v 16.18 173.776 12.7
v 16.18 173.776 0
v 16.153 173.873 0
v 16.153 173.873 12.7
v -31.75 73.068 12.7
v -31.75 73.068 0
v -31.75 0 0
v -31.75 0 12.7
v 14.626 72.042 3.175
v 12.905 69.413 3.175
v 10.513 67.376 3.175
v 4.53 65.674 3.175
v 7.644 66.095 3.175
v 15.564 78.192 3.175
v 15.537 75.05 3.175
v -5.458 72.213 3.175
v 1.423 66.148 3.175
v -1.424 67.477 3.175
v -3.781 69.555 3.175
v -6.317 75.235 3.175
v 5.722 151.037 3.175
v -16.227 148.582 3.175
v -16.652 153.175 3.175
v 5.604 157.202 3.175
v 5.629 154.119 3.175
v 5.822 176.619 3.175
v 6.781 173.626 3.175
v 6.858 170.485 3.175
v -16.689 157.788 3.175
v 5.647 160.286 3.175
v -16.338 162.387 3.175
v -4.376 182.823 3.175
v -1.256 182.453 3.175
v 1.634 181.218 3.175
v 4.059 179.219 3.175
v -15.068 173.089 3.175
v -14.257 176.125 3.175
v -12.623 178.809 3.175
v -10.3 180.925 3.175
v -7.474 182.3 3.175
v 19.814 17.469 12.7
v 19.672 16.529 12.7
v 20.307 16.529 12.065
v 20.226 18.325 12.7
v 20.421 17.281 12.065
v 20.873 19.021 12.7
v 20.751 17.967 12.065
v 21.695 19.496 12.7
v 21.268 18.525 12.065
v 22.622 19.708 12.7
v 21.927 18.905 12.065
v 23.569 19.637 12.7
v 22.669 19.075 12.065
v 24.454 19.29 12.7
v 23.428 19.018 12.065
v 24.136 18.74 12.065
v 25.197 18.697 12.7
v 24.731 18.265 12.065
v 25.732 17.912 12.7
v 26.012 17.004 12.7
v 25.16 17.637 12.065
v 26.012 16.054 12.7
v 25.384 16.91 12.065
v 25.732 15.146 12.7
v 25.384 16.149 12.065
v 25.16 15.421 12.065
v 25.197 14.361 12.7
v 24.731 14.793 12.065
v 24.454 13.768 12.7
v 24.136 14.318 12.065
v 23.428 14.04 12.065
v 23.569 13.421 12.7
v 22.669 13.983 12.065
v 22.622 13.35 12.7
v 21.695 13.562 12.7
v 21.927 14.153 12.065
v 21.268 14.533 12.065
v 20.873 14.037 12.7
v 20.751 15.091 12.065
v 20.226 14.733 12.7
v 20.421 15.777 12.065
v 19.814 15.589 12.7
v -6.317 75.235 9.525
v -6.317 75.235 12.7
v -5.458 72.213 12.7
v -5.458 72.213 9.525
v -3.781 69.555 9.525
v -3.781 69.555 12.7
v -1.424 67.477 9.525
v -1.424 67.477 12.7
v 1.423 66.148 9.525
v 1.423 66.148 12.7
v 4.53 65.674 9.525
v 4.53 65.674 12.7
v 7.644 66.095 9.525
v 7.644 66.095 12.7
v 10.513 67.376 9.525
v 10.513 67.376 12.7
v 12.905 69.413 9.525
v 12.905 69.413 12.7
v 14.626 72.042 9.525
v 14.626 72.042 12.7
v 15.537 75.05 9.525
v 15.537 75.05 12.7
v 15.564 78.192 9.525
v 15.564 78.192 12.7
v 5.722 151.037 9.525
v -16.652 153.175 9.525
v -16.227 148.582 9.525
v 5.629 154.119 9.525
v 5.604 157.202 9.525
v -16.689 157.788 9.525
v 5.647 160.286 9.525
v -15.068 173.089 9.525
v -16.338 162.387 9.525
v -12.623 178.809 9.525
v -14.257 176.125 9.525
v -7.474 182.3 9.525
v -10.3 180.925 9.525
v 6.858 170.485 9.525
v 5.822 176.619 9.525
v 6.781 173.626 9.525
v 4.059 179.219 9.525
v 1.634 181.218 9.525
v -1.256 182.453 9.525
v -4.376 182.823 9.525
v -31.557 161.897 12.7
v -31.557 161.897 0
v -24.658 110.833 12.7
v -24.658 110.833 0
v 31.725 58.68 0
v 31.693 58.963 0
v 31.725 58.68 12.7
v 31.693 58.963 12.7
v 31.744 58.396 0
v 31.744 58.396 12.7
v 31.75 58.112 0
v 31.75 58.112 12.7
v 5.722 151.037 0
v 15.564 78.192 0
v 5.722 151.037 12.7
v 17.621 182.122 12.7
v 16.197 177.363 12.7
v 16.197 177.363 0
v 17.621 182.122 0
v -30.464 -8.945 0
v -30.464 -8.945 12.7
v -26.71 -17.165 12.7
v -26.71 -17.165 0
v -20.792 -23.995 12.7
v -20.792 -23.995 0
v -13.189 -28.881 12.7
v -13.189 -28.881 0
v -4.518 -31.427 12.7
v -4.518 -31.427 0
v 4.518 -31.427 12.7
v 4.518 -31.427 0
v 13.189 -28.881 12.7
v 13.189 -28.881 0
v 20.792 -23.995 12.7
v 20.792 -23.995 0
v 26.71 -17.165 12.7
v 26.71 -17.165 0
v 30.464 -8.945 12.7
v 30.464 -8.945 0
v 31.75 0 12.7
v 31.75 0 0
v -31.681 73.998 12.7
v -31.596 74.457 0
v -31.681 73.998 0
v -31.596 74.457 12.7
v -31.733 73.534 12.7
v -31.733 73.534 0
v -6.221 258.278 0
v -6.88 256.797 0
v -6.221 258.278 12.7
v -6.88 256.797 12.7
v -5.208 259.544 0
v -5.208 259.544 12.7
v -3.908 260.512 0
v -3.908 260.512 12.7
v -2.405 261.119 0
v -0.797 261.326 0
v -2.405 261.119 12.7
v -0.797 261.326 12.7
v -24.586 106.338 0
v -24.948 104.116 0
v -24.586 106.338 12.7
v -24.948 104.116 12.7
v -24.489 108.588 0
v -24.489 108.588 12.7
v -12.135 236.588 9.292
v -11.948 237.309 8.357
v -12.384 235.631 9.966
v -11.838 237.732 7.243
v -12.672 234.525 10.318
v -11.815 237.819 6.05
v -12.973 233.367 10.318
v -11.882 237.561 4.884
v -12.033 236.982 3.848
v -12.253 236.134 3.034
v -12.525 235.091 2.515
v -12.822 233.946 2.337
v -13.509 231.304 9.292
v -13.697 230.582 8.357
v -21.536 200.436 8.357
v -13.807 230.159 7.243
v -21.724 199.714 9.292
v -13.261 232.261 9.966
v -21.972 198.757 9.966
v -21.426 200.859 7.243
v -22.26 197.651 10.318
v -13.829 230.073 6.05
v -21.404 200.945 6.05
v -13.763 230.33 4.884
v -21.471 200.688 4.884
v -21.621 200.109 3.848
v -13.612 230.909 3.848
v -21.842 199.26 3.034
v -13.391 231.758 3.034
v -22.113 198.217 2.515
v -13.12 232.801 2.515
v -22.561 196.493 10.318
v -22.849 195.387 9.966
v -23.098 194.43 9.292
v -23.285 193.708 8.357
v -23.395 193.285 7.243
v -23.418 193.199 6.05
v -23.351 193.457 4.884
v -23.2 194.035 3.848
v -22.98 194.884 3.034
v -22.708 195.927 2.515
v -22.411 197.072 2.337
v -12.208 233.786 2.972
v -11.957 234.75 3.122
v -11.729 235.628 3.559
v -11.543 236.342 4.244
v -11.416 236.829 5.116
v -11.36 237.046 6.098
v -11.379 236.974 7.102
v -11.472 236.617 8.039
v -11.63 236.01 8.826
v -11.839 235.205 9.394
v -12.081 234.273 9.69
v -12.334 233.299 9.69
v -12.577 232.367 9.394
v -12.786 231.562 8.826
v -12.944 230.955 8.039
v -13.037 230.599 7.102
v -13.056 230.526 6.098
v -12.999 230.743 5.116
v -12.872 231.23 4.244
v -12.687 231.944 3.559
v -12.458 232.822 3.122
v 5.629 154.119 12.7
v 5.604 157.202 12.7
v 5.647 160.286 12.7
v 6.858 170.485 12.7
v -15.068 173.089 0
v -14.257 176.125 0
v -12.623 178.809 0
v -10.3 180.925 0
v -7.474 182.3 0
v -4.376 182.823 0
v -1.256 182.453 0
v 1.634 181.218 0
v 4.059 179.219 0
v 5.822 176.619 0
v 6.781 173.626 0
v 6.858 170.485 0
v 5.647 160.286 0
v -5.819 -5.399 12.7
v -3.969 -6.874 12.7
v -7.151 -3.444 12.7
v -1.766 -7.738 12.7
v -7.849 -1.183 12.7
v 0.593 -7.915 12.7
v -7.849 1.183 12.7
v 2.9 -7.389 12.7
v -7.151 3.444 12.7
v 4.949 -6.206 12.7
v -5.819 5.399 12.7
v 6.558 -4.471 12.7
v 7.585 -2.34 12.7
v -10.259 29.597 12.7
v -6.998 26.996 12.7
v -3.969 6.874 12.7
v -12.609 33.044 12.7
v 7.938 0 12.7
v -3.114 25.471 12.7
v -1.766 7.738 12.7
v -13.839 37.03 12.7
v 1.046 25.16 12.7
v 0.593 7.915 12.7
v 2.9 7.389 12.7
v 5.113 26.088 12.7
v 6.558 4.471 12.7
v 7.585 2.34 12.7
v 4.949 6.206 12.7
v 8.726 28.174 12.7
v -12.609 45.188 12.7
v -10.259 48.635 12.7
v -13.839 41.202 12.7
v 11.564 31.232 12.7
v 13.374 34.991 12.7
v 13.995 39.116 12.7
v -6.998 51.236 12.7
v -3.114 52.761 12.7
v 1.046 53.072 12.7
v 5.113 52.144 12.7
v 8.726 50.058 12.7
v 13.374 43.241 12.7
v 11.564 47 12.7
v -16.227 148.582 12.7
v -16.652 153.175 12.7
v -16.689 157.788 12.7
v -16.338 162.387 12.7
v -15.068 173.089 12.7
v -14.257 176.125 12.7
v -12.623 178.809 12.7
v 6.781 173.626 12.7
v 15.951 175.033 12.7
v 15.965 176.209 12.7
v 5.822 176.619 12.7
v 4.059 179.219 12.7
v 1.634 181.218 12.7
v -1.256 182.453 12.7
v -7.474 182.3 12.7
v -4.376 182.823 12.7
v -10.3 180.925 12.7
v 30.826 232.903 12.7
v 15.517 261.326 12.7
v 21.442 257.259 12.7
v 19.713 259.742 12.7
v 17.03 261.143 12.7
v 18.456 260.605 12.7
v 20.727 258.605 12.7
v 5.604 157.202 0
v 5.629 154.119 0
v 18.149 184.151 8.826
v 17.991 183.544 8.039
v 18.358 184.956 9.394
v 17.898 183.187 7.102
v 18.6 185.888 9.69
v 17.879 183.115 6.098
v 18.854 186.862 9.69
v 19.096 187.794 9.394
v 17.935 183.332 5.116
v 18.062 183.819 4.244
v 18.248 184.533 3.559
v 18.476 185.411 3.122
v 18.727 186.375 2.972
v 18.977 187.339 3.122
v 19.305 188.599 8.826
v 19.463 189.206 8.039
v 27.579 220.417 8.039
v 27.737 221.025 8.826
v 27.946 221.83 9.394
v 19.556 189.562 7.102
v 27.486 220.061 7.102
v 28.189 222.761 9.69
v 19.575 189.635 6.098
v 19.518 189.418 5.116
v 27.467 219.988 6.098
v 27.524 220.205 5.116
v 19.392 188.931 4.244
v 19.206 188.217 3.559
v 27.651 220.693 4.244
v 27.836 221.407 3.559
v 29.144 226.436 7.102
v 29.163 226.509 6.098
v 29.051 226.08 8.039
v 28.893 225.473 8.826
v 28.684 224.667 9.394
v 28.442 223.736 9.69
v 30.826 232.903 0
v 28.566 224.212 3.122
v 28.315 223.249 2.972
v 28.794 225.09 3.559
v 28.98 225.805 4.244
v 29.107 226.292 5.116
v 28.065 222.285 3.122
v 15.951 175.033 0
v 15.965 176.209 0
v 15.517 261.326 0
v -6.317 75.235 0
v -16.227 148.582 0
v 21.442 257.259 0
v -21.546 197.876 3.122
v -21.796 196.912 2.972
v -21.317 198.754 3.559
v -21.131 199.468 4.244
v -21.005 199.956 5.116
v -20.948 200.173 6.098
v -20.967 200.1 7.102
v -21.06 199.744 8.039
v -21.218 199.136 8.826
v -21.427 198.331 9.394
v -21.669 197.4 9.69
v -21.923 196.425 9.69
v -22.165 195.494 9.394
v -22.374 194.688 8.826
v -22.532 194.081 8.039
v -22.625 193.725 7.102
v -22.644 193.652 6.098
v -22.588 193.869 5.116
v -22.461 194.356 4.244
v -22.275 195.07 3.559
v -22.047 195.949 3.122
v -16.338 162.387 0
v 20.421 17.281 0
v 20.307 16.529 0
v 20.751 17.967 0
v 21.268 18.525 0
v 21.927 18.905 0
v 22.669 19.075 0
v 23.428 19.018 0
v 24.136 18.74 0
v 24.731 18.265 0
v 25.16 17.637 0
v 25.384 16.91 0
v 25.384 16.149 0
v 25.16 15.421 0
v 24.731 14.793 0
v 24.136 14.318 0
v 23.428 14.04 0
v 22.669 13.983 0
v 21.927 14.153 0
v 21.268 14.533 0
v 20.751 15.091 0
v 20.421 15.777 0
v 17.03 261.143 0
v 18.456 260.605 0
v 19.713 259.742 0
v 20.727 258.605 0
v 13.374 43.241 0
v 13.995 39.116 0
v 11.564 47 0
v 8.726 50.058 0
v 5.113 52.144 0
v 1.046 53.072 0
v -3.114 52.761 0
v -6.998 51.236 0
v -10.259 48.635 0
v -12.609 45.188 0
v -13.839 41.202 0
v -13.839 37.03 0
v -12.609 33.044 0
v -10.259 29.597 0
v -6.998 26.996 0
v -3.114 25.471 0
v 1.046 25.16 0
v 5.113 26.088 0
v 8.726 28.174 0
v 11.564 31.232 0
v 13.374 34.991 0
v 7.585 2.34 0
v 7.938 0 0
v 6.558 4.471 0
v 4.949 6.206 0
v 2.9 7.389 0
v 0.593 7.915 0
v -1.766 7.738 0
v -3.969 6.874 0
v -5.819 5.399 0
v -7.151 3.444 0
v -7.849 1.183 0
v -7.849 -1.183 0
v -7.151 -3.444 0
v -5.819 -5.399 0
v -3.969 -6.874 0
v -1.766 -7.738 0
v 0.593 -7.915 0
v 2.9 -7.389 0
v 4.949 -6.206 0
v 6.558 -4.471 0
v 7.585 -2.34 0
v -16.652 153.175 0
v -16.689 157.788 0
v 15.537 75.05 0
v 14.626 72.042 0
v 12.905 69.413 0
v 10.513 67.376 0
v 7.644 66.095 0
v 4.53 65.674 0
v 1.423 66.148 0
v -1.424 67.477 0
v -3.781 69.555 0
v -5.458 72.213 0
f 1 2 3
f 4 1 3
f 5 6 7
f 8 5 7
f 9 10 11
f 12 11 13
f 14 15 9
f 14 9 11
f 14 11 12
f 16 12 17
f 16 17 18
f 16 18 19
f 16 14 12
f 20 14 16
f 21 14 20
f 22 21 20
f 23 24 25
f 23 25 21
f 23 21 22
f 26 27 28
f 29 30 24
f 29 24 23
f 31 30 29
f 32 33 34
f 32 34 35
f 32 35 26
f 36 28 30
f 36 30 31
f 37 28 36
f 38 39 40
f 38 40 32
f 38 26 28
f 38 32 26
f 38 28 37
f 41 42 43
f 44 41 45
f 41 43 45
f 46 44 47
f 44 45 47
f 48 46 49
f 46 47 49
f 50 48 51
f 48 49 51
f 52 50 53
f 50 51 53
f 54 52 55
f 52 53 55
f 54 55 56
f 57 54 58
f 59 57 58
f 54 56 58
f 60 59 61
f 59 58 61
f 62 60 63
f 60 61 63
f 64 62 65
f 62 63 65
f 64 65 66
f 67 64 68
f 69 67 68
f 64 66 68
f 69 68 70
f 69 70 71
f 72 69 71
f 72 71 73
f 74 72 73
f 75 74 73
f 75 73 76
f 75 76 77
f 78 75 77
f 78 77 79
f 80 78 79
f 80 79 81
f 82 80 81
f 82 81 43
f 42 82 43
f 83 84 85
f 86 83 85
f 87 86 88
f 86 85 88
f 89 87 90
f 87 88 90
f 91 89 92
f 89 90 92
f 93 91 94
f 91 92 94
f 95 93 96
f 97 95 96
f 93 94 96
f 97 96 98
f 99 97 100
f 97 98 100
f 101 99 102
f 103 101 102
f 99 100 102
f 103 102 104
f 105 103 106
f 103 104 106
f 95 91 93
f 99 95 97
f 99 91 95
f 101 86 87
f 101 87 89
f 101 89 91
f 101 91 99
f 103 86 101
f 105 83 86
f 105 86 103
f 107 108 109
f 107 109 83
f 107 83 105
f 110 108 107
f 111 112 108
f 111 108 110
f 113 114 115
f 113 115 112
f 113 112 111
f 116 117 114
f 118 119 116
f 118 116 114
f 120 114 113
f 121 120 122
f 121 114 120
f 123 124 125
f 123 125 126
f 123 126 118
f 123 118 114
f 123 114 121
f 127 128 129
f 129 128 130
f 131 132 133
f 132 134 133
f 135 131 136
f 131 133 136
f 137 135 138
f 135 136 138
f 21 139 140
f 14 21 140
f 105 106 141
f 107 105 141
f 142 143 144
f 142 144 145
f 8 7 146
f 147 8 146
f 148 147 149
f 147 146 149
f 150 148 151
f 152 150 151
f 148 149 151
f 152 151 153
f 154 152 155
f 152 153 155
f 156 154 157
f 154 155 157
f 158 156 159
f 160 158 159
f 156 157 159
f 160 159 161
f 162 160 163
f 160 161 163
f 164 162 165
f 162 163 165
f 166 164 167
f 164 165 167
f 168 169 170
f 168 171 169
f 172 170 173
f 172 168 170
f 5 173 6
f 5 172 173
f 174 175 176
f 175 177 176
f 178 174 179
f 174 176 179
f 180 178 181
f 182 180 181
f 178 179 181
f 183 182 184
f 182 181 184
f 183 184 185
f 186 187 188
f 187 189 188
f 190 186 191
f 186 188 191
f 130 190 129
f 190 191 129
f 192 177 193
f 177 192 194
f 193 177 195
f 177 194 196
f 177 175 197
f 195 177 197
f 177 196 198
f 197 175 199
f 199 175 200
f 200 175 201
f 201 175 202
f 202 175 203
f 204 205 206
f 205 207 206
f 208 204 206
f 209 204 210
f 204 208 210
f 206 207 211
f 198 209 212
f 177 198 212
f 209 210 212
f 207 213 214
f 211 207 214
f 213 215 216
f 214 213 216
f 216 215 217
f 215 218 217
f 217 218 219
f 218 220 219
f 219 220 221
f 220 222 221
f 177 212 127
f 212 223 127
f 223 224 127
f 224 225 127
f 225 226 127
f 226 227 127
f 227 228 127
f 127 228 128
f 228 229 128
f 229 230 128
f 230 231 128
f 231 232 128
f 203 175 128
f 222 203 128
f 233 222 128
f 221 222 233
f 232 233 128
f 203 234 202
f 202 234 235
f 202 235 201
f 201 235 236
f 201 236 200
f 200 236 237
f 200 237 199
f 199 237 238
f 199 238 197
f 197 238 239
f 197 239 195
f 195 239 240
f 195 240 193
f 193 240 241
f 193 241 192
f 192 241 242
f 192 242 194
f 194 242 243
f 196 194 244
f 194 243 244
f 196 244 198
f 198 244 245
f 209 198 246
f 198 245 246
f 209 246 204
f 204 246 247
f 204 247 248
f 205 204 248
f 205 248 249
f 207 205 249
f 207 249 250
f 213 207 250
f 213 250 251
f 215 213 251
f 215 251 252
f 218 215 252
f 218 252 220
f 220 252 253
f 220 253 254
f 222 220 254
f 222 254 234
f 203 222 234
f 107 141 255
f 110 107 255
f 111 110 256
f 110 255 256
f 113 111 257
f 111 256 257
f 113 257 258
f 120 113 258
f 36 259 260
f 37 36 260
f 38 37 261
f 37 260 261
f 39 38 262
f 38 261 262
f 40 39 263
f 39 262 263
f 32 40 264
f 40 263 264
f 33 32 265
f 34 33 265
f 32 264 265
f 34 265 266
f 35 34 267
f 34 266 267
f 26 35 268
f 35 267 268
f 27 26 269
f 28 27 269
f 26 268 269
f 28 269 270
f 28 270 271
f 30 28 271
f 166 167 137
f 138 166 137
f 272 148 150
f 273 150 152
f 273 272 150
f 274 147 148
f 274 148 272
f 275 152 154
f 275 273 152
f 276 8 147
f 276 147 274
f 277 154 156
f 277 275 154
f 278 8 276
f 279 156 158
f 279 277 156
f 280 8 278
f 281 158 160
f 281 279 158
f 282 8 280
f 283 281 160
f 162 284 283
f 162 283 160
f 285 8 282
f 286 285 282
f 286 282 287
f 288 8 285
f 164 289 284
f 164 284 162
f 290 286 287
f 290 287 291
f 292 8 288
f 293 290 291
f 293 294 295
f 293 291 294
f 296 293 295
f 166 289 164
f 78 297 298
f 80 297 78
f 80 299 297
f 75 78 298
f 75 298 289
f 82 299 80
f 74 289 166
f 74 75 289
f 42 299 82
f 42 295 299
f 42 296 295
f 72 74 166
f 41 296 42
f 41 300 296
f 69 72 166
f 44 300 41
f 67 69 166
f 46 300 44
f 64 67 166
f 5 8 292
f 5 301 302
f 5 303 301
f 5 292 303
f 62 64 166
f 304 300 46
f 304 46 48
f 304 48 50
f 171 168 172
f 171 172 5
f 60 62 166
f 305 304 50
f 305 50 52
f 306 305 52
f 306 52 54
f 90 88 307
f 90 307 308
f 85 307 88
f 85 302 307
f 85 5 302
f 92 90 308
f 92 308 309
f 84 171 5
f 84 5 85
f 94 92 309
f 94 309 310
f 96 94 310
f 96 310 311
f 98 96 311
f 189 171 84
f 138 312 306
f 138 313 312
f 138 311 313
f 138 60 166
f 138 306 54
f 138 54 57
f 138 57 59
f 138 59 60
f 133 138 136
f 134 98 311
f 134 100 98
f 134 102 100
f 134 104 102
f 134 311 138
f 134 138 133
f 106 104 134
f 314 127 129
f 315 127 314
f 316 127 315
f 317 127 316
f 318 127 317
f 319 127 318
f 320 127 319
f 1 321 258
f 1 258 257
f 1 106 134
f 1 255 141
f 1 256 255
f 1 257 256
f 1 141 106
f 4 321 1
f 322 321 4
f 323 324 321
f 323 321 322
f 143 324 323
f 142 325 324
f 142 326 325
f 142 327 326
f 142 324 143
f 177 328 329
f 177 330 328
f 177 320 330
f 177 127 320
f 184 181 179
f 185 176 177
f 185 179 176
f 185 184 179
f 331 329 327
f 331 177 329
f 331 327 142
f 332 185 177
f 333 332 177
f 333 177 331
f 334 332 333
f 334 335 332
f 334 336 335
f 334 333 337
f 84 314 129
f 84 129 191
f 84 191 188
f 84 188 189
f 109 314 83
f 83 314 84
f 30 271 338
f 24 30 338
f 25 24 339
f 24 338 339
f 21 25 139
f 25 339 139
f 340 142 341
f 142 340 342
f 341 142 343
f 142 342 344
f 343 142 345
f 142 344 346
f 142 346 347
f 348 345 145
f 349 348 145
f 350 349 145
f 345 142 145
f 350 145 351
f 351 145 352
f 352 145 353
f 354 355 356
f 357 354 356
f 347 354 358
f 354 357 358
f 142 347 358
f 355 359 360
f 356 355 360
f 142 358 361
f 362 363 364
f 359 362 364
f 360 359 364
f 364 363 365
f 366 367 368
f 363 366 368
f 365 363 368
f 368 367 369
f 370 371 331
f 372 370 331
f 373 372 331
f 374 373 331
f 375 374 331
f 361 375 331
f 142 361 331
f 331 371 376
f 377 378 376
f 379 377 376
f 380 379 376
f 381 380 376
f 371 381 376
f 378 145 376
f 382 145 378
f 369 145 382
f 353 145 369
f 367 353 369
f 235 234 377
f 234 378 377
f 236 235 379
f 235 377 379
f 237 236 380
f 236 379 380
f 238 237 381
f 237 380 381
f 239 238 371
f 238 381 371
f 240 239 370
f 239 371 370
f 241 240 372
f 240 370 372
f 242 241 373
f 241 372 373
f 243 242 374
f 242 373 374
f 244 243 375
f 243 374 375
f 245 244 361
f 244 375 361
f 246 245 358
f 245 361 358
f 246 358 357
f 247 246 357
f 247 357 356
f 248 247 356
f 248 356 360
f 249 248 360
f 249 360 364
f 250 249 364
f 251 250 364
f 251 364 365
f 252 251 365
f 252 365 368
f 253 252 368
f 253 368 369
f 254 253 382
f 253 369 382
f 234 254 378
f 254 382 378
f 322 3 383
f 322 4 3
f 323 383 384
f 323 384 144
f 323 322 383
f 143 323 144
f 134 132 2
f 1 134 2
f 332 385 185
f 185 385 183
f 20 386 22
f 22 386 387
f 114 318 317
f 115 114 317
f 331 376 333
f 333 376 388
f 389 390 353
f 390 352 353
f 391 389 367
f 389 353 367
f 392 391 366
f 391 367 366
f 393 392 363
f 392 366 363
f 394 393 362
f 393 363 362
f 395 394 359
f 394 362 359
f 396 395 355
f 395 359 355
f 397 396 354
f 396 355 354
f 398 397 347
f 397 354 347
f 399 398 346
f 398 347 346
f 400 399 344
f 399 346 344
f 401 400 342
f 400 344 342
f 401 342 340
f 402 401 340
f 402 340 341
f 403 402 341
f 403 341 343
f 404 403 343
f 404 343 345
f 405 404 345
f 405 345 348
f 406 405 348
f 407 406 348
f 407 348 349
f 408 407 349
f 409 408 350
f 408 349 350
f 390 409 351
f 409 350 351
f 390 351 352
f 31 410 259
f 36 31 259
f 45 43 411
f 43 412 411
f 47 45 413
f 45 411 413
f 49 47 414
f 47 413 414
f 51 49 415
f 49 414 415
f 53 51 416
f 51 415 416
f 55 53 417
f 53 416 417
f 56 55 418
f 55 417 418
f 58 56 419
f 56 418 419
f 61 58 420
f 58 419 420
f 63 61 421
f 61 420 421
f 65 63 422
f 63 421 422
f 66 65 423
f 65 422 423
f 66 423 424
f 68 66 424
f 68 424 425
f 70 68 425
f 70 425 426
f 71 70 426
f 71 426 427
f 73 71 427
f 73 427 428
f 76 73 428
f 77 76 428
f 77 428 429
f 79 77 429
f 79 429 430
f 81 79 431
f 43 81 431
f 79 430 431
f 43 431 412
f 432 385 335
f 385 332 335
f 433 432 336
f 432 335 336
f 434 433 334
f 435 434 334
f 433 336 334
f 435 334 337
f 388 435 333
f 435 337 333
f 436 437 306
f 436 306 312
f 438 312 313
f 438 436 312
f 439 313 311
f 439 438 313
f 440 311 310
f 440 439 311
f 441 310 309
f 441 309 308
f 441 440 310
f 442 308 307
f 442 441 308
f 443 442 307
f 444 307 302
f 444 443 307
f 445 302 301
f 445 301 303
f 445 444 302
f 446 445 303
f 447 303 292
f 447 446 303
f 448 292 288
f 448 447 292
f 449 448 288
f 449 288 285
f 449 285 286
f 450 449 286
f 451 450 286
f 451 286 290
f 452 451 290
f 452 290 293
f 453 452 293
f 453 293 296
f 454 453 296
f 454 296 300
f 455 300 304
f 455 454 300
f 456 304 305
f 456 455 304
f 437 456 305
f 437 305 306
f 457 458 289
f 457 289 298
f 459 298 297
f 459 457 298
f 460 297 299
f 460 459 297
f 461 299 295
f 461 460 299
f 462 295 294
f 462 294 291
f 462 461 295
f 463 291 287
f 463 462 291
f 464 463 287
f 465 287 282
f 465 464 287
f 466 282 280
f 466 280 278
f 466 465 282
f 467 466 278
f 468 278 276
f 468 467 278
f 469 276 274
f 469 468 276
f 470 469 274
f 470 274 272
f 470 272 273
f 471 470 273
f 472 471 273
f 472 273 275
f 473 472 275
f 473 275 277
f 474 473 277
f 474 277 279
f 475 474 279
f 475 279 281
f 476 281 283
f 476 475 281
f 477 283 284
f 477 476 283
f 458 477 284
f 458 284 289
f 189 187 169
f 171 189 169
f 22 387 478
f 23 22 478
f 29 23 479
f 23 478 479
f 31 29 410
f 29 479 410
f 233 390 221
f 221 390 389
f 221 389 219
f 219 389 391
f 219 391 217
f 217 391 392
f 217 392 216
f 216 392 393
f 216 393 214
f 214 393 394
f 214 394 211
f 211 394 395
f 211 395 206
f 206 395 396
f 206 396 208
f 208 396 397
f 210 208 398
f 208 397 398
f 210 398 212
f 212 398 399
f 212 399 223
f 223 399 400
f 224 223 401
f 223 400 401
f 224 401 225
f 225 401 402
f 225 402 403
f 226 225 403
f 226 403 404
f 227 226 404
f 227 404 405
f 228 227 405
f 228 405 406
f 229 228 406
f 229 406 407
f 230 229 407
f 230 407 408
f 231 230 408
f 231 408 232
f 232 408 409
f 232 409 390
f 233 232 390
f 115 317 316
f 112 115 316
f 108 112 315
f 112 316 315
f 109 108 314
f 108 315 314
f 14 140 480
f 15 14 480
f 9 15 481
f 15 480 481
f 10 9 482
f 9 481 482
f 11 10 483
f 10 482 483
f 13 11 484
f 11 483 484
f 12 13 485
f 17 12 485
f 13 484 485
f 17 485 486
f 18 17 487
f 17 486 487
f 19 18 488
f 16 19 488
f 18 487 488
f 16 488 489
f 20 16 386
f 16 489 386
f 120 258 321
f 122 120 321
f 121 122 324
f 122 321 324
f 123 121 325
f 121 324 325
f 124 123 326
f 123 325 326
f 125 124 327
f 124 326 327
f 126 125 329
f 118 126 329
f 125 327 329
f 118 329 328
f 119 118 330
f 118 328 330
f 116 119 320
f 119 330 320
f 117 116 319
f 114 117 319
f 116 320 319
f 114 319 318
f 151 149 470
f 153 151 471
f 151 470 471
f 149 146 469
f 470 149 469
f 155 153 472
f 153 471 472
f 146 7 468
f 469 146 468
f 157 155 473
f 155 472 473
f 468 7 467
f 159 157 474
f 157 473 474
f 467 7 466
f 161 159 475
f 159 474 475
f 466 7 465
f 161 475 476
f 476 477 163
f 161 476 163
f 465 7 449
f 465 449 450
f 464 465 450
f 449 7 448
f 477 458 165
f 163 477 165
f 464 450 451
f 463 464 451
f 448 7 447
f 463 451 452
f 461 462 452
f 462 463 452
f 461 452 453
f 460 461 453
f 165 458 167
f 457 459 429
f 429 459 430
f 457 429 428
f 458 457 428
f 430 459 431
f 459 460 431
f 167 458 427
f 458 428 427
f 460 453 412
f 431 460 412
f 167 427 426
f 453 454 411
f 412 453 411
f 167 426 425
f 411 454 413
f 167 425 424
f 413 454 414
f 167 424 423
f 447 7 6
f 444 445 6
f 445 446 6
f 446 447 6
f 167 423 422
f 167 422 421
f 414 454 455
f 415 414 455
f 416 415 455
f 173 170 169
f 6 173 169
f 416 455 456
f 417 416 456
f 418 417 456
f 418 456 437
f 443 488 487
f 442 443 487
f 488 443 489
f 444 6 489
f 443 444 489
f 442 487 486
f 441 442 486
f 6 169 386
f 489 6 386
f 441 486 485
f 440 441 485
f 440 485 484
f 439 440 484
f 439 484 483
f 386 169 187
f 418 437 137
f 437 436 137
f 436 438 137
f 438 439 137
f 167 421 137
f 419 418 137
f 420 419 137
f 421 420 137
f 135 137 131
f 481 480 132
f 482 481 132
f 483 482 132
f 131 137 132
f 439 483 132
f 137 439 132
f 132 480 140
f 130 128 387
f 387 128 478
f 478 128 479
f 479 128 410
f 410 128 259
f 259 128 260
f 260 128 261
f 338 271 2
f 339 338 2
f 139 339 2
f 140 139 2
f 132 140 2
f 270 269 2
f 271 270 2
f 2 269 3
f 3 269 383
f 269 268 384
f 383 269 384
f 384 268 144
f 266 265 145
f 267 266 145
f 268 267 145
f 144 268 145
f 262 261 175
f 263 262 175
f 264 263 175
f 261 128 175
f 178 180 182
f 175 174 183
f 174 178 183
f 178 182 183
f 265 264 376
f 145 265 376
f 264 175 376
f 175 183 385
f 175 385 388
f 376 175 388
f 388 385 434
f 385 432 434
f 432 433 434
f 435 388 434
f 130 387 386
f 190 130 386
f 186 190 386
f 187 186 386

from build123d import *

# Parameters (mm, degrees)
SKETCH1_R                         = 7.9375
SKETCH1_R_2                       = 13.9954
BOSS_EXTRUDE1_DEPTH               = 12.7
FILLET3_R                         = 19.05
FILLET1_R                         = 6.35
F_10_CLEARANCE_HOLE2_D            = 5.1054
F_10_CLEARANCE_HOLE2_CSINK_D      = 6.3754
F_10_CLEARANCE_HOLE2_CSINK_ANGLE  = 90
CUT_EXTRUDE1_DEPTH                = 1
CUT_EXTRUDE1_DEPTH_BACK           = 13.7
FILLET2_R                         = 6.35
CUT_EXTRUDE3_DEPTH                = 1
CUT_EXTRUDE3_DEPTH_BACK           = 13.7
F_1_4_CLEARANCE_HOLE1_D           = 6.7564
F_1_4_CLEARANCE_HOLE1_CSINK_D     = 8.0264
F_1_4_CLEARANCE_HOLE1_CSINK_ANGLE = 90
CUT_EXTRUDE4_DEPTH                = 3.175
CUT_EXTRUDE5_DEPTH                = 3.175


with BuildPart() as part:
    # Sketch1 → Boss-Extrude1 (new body)
    with BuildSketch(Plane.XY):
        with BuildLine():
            Line((-24.200430201, 107.448474159), (-31.75, 73.770562428))
            Line((-31.75, 73.770562428), (-31.75, 0))
            ThreePointArc((-31.75, 0), (0, -31.75), (31.75, 0))
            Line((31.75, 0), (31.75, 116.627004246))
            Line((31.75, 116.627004246), (15.676297005, 175.624413942))
            Line((15.676297005, 175.624413942), (31.947601555, 229.990483385))
            Line((31.947601555, 229.990483385), (19.875208624, 261.32607122))
            Line((19.875208624, 261.32607122), (-5.524791376, 261.32607122))
            Line((-5.524791376, 261.32607122), (-32.716068836, 170.47392878))
            Line((-32.716068836, 170.47392878), (-24.200430201, 107.448474159))
        make_face()
        Circle(SKETCH1_R, mode=Mode.SUBTRACT)
        with Locations((0, 39.116)):
            Circle(SKETCH1_R_2, mode=Mode.SUBTRACT)
    extrude(amount=BOSS_EXTRUDE1_DEPTH)

    # Fillet3
    fillet3_edges = [part.edges().sort_by_distance(p)[0] for p in [
        (-24.200430201, 107.448474159, 6.35),
    ]]
    fillet(fillet3_edges, radius=FILLET3_R)

    # Fillet1
    fillet1_edges = [part.edges().sort_by_distance(p)[0] for p in [
        (-32.716068836, 170.47392878, 6.35),
        (-5.524791376, 261.32607122, 6.35),
        (19.875208624, 261.32607122, 6.35),
        (31.947601555, 229.990483385, 6.35),
        (15.676297005, 175.624413942, 6.35),
        (31.75, 116.627004246, 6.35),
        (-31.75, 73.770562428, 6.35),
    ]]
    fillet(fillet1_edges, radius=FILLET1_R)

    # #10 Clearance Hole2 (through all)
    with Locations(Plane.XY.offset(12.7)):
        with Locations((22.86, 16.52905)):
            CounterSinkHole(F_10_CLEARANCE_HOLE2_D / 2, F_10_CLEARANCE_HOLE2_CSINK_D / 2, counter_sink_angle=F_10_CLEARANCE_HOLE2_CSINK_ANGLE)

    # Sketch17 → Cut-Extrude1 (cut, two sides)
    with BuildSketch(Plane(origin=(0, 0, 0), x_dir=(-1, 0, 0), z_dir=(0, 0, -1))) as cut_extrude1_sk:
        with BuildLine():
            Line((-31.75, 58.539367012), (-16.179878819, 173.776051895))
            Line((-16.179878819, 173.776051895), (-31.526685006, 117.446666412))
            ThreePointArc((-31.526685006, 117.446666412), (-31.693923649, 116.619502039), (-31.75, 115.777465753))
            Line((-31.75, 115.777465753), (-31.75, 58.539367012))
        make_face()
    extrude(amount=CUT_EXTRUDE1_DEPTH, mode=Mode.SUBTRACT)
    extrude(cut_extrude1_sk.sketch, amount=-CUT_EXTRUDE1_DEPTH_BACK, mode=Mode.SUBTRACT)

    # Fillet2
    fillet2_edges = [part.edges().sort_by_distance(p)[0] for p in [
        (31.75, 58.539367012, 6.35),
    ]]
    fillet(fillet2_edges, radius=FILLET2_R)

    # Sketch19 → Cut-Extrude3 (cut, two sides)
    with BuildSketch(Plane(origin=(0, 0, 0), x_dir=(-1, 0, 0), z_dir=(0, 0, -1))) as cut_extrude3_sk:
        with BuildLine():
            Line((-17.620933209, 182.121878639), (-30.825593631, 232.902812203))
            Line((-30.825593631, 232.902812203), (-31.167525601, 232.015279853))
            ThreePointArc((-31.167525601, 232.015279853), (-31.587367542, 229.976620184), (-31.325446349, 227.911723628))
            Line((-31.325446349, 227.911723628), (-17.620933209, 182.121878639))
        make_face()
        with BuildLine():
            Line((32.32313572, 171.786806246), (6.880371133, 256.796775922))
            Line((6.880371133, 256.796775922), (31.557248698, 161.897335866))
            Line((31.557248698, 161.897335866), (32.532573251, 169.115851816))
            ThreePointArc((32.532573251, 169.115851816), (32.570321666, 170.462500309), (32.32313572, 171.786806246))
        make_face()
    extrude(amount=CUT_EXTRUDE3_DEPTH, mode=Mode.SUBTRACT)
    extrude(cut_extrude3_sk.sketch, amount=-CUT_EXTRUDE3_DEPTH_BACK, mode=Mode.SUBTRACT)

    # 1/4 Clearance Hole1 (through all)
    with Locations(Plane(origin=(-68.990792956, 17.939803964, 0), x_dir=(0, 0, 1), z_dir=(-0.967814998, 0.251662731, 0))):
        with Locations((6.35, 185.089358388), (6.35, 223.189358388)):
            CounterSinkHole(F_1_4_CLEARANCE_HOLE1_D / 2, F_1_4_CLEARANCE_HOLE1_CSINK_D / 2, counter_sink_angle=F_1_4_CLEARANCE_HOLE1_CSINK_ANGLE)

    # Sketch22 → Cut-Extrude4 (cut)
    with BuildSketch(Plane(origin=(0, 0, 0), x_dir=(-1, 0, 0), z_dir=(0, 0, -1))):
        with BuildLine():
            Line((-5.721549742, 151.036596427), (-15.563924684, 78.191777395))
            ThreePointArc((-15.563924684, 78.191777395), (-6.101580096, 65.772977875), (6.317219423, 75.235322463))
            Line((6.317219423, 75.235322463), (16.227356213, 148.58165658))
            ThreePointArc((16.227356213, 148.58165658), (16.127581623, 152.147558265), (14.895920611, 155.495486123))
            ThreePointArc((14.895920611, 155.495486123), (5.286667697, 150.045412833), (-4.233623122, 155.649438455))
            ThreePointArc((-4.233623122, 155.649438455), (-5.148189302, 153.664409279), (-5.653787894, 151.538111511))
            Line((-5.653787894, 151.538111511), (-5.721549742, 151.036596427))
        make_face()
        with BuildLine():
            ThreePointArc((14.895920611, 155.495486123), (5.375629793, 161.099511745), (-4.233623122, 155.649438455))
            ThreePointArc((-4.233623122, 155.649438455), (5.286667697, 150.045412833), (14.895920611, 155.495486123))
        make_face()
        with BuildLine():
            Line((-6.858366152, 170.484855738), (-5.647114594, 160.285630757))
            Line((-5.647114594, 160.285630757), (-5.587433271, 159.783090025))
            ThreePointArc((-5.587433271, 159.783090025), (-5.116122344, 157.648930204), (-4.233623122, 155.649438455))
            ThreePointArc((-4.233623122, 155.649438455), (5.375629793, 161.099511745), (14.895920611, 155.495486123))
            ThreePointArc((14.895920611, 155.495486123), (16.181306062, 158.823157086), (16.338459931, 162.386991041))
            Line((16.338459931, 162.386991041), (15.06752705, 173.088756754))
            ThreePointArc((15.06752705, 173.088756754), (2.802629941, 182.749752847), (-6.858366152, 170.484855738))
        make_face()
        with BuildLine():
            ThreePointArc((14.895920611, 155.495486123), (16.127581623, 152.147558265), (16.227356213, 148.58165658))
            ThreePointArc((16.227356213, 148.58165658), (16.719229878, 155.480812344), (16.338459931, 162.386991041))
            ThreePointArc((16.338459931, 162.386991041), (16.181306062, 158.823157086), (14.895920611, 155.495486123))
        make_face()
        with BuildLine():
            ThreePointArc((-5.647114594, 160.285630757), (-5.608314081, 155.660501807), (-5.721549742, 151.036596427))
            Line((-5.721549742, 151.036596427), (-5.653787894, 151.538111511))
            ThreePointArc((-5.653787894, 151.538111511), (-5.148189302, 153.664409279), (-4.233623122, 155.649438455))
            ThreePointArc((-4.233623122, 155.649438455), (-5.116122344, 157.648930204), (-5.587433271, 159.783090025))
            Line((-5.587433271, 159.783090025), (-5.647114594, 160.285630757))
        make_face()
    extrude(amount=-CUT_EXTRUDE4_DEPTH, mode=Mode.SUBTRACT)

    # Sketch23 → Cut-Extrude5 (cut)
    with BuildSketch(Plane.XY.offset(12.7)):
        with BuildLine():
            ThreePointArc((-6.317219423, 75.235322463), (6.101580096, 65.772977875), (15.563924684, 78.191777395))
            Line((15.563924684, 78.191777395), (5.721549742, 151.036596427))
            Line((5.721549742, 151.036596427), (5.653787894, 151.538111511))
            ThreePointArc((5.653787894, 151.538111511), (5.148189302, 153.664409279), (4.233623122, 155.649438455))
            ThreePointArc((4.233623122, 155.649438455), (-5.286667697, 150.045412833), (-14.895920611, 155.495486123))
            ThreePointArc((-14.895920611, 155.495486123), (-16.127581623, 152.147558265), (-16.227356213, 148.58165658))
            Line((-16.227356213, 148.58165658), (-6.317219423, 75.235322463))
        make_face()
        with BuildLine():
            ThreePointArc((-14.895920611, 155.495486123), (-5.286667697, 150.045412833), (4.233623122, 155.649438455))
            ThreePointArc((4.233623122, 155.649438455), (-5.375629793, 161.099511745), (-14.895920611, 155.495486123))
        make_face()
        with BuildLine():
            Line((5.587433271, 159.783090025), (5.647114594, 160.285630757))
            Line((5.647114594, 160.285630757), (6.858366152, 170.484855738))
            ThreePointArc((6.858366152, 170.484855738), (-2.802629941, 182.749752847), (-15.06752705, 173.088756754))
            Line((-15.06752705, 173.088756754), (-16.338459931, 162.386991041))
            ThreePointArc((-16.338459931, 162.386991041), (-16.181306062, 158.823157086), (-14.895920611, 155.495486123))
            ThreePointArc((-14.895920611, 155.495486123), (-5.375629793, 161.099511745), (4.233623122, 155.649438455))
            ThreePointArc((4.233623122, 155.649438455), (5.116122344, 157.648930204), (5.587433271, 159.783090025))
        make_face()
        with BuildLine():
            ThreePointArc((-16.338459931, 162.386991041), (-16.719229878, 155.480812344), (-16.227356213, 148.58165658))
            ThreePointArc((-16.227356213, 148.58165658), (-16.127581623, 152.147558265), (-14.895920611, 155.495486123))
            ThreePointArc((-14.895920611, 155.495486123), (-16.181306062, 158.823157086), (-16.338459931, 162.386991041))
        make_face()
        with BuildLine():
            Line((5.653787894, 151.538111511), (5.721549742, 151.036596427))
            ThreePointArc((5.721549742, 151.036596427), (5.608314081, 155.660501807), (5.647114594, 160.285630757))
            Line((5.647114594, 160.285630757), (5.587433271, 159.783090025))
            ThreePointArc((5.587433271, 159.783090025), (5.116122344, 157.648930204), (4.233623122, 155.649438455))
            ThreePointArc((4.233623122, 155.649438455), (5.148189302, 153.664409279), (5.653787894, 151.538111511))
        make_face()
    extrude(amount=-CUT_EXTRUDE5_DEPTH, mode=Mode.SUBTRACT)


solid = part.part
